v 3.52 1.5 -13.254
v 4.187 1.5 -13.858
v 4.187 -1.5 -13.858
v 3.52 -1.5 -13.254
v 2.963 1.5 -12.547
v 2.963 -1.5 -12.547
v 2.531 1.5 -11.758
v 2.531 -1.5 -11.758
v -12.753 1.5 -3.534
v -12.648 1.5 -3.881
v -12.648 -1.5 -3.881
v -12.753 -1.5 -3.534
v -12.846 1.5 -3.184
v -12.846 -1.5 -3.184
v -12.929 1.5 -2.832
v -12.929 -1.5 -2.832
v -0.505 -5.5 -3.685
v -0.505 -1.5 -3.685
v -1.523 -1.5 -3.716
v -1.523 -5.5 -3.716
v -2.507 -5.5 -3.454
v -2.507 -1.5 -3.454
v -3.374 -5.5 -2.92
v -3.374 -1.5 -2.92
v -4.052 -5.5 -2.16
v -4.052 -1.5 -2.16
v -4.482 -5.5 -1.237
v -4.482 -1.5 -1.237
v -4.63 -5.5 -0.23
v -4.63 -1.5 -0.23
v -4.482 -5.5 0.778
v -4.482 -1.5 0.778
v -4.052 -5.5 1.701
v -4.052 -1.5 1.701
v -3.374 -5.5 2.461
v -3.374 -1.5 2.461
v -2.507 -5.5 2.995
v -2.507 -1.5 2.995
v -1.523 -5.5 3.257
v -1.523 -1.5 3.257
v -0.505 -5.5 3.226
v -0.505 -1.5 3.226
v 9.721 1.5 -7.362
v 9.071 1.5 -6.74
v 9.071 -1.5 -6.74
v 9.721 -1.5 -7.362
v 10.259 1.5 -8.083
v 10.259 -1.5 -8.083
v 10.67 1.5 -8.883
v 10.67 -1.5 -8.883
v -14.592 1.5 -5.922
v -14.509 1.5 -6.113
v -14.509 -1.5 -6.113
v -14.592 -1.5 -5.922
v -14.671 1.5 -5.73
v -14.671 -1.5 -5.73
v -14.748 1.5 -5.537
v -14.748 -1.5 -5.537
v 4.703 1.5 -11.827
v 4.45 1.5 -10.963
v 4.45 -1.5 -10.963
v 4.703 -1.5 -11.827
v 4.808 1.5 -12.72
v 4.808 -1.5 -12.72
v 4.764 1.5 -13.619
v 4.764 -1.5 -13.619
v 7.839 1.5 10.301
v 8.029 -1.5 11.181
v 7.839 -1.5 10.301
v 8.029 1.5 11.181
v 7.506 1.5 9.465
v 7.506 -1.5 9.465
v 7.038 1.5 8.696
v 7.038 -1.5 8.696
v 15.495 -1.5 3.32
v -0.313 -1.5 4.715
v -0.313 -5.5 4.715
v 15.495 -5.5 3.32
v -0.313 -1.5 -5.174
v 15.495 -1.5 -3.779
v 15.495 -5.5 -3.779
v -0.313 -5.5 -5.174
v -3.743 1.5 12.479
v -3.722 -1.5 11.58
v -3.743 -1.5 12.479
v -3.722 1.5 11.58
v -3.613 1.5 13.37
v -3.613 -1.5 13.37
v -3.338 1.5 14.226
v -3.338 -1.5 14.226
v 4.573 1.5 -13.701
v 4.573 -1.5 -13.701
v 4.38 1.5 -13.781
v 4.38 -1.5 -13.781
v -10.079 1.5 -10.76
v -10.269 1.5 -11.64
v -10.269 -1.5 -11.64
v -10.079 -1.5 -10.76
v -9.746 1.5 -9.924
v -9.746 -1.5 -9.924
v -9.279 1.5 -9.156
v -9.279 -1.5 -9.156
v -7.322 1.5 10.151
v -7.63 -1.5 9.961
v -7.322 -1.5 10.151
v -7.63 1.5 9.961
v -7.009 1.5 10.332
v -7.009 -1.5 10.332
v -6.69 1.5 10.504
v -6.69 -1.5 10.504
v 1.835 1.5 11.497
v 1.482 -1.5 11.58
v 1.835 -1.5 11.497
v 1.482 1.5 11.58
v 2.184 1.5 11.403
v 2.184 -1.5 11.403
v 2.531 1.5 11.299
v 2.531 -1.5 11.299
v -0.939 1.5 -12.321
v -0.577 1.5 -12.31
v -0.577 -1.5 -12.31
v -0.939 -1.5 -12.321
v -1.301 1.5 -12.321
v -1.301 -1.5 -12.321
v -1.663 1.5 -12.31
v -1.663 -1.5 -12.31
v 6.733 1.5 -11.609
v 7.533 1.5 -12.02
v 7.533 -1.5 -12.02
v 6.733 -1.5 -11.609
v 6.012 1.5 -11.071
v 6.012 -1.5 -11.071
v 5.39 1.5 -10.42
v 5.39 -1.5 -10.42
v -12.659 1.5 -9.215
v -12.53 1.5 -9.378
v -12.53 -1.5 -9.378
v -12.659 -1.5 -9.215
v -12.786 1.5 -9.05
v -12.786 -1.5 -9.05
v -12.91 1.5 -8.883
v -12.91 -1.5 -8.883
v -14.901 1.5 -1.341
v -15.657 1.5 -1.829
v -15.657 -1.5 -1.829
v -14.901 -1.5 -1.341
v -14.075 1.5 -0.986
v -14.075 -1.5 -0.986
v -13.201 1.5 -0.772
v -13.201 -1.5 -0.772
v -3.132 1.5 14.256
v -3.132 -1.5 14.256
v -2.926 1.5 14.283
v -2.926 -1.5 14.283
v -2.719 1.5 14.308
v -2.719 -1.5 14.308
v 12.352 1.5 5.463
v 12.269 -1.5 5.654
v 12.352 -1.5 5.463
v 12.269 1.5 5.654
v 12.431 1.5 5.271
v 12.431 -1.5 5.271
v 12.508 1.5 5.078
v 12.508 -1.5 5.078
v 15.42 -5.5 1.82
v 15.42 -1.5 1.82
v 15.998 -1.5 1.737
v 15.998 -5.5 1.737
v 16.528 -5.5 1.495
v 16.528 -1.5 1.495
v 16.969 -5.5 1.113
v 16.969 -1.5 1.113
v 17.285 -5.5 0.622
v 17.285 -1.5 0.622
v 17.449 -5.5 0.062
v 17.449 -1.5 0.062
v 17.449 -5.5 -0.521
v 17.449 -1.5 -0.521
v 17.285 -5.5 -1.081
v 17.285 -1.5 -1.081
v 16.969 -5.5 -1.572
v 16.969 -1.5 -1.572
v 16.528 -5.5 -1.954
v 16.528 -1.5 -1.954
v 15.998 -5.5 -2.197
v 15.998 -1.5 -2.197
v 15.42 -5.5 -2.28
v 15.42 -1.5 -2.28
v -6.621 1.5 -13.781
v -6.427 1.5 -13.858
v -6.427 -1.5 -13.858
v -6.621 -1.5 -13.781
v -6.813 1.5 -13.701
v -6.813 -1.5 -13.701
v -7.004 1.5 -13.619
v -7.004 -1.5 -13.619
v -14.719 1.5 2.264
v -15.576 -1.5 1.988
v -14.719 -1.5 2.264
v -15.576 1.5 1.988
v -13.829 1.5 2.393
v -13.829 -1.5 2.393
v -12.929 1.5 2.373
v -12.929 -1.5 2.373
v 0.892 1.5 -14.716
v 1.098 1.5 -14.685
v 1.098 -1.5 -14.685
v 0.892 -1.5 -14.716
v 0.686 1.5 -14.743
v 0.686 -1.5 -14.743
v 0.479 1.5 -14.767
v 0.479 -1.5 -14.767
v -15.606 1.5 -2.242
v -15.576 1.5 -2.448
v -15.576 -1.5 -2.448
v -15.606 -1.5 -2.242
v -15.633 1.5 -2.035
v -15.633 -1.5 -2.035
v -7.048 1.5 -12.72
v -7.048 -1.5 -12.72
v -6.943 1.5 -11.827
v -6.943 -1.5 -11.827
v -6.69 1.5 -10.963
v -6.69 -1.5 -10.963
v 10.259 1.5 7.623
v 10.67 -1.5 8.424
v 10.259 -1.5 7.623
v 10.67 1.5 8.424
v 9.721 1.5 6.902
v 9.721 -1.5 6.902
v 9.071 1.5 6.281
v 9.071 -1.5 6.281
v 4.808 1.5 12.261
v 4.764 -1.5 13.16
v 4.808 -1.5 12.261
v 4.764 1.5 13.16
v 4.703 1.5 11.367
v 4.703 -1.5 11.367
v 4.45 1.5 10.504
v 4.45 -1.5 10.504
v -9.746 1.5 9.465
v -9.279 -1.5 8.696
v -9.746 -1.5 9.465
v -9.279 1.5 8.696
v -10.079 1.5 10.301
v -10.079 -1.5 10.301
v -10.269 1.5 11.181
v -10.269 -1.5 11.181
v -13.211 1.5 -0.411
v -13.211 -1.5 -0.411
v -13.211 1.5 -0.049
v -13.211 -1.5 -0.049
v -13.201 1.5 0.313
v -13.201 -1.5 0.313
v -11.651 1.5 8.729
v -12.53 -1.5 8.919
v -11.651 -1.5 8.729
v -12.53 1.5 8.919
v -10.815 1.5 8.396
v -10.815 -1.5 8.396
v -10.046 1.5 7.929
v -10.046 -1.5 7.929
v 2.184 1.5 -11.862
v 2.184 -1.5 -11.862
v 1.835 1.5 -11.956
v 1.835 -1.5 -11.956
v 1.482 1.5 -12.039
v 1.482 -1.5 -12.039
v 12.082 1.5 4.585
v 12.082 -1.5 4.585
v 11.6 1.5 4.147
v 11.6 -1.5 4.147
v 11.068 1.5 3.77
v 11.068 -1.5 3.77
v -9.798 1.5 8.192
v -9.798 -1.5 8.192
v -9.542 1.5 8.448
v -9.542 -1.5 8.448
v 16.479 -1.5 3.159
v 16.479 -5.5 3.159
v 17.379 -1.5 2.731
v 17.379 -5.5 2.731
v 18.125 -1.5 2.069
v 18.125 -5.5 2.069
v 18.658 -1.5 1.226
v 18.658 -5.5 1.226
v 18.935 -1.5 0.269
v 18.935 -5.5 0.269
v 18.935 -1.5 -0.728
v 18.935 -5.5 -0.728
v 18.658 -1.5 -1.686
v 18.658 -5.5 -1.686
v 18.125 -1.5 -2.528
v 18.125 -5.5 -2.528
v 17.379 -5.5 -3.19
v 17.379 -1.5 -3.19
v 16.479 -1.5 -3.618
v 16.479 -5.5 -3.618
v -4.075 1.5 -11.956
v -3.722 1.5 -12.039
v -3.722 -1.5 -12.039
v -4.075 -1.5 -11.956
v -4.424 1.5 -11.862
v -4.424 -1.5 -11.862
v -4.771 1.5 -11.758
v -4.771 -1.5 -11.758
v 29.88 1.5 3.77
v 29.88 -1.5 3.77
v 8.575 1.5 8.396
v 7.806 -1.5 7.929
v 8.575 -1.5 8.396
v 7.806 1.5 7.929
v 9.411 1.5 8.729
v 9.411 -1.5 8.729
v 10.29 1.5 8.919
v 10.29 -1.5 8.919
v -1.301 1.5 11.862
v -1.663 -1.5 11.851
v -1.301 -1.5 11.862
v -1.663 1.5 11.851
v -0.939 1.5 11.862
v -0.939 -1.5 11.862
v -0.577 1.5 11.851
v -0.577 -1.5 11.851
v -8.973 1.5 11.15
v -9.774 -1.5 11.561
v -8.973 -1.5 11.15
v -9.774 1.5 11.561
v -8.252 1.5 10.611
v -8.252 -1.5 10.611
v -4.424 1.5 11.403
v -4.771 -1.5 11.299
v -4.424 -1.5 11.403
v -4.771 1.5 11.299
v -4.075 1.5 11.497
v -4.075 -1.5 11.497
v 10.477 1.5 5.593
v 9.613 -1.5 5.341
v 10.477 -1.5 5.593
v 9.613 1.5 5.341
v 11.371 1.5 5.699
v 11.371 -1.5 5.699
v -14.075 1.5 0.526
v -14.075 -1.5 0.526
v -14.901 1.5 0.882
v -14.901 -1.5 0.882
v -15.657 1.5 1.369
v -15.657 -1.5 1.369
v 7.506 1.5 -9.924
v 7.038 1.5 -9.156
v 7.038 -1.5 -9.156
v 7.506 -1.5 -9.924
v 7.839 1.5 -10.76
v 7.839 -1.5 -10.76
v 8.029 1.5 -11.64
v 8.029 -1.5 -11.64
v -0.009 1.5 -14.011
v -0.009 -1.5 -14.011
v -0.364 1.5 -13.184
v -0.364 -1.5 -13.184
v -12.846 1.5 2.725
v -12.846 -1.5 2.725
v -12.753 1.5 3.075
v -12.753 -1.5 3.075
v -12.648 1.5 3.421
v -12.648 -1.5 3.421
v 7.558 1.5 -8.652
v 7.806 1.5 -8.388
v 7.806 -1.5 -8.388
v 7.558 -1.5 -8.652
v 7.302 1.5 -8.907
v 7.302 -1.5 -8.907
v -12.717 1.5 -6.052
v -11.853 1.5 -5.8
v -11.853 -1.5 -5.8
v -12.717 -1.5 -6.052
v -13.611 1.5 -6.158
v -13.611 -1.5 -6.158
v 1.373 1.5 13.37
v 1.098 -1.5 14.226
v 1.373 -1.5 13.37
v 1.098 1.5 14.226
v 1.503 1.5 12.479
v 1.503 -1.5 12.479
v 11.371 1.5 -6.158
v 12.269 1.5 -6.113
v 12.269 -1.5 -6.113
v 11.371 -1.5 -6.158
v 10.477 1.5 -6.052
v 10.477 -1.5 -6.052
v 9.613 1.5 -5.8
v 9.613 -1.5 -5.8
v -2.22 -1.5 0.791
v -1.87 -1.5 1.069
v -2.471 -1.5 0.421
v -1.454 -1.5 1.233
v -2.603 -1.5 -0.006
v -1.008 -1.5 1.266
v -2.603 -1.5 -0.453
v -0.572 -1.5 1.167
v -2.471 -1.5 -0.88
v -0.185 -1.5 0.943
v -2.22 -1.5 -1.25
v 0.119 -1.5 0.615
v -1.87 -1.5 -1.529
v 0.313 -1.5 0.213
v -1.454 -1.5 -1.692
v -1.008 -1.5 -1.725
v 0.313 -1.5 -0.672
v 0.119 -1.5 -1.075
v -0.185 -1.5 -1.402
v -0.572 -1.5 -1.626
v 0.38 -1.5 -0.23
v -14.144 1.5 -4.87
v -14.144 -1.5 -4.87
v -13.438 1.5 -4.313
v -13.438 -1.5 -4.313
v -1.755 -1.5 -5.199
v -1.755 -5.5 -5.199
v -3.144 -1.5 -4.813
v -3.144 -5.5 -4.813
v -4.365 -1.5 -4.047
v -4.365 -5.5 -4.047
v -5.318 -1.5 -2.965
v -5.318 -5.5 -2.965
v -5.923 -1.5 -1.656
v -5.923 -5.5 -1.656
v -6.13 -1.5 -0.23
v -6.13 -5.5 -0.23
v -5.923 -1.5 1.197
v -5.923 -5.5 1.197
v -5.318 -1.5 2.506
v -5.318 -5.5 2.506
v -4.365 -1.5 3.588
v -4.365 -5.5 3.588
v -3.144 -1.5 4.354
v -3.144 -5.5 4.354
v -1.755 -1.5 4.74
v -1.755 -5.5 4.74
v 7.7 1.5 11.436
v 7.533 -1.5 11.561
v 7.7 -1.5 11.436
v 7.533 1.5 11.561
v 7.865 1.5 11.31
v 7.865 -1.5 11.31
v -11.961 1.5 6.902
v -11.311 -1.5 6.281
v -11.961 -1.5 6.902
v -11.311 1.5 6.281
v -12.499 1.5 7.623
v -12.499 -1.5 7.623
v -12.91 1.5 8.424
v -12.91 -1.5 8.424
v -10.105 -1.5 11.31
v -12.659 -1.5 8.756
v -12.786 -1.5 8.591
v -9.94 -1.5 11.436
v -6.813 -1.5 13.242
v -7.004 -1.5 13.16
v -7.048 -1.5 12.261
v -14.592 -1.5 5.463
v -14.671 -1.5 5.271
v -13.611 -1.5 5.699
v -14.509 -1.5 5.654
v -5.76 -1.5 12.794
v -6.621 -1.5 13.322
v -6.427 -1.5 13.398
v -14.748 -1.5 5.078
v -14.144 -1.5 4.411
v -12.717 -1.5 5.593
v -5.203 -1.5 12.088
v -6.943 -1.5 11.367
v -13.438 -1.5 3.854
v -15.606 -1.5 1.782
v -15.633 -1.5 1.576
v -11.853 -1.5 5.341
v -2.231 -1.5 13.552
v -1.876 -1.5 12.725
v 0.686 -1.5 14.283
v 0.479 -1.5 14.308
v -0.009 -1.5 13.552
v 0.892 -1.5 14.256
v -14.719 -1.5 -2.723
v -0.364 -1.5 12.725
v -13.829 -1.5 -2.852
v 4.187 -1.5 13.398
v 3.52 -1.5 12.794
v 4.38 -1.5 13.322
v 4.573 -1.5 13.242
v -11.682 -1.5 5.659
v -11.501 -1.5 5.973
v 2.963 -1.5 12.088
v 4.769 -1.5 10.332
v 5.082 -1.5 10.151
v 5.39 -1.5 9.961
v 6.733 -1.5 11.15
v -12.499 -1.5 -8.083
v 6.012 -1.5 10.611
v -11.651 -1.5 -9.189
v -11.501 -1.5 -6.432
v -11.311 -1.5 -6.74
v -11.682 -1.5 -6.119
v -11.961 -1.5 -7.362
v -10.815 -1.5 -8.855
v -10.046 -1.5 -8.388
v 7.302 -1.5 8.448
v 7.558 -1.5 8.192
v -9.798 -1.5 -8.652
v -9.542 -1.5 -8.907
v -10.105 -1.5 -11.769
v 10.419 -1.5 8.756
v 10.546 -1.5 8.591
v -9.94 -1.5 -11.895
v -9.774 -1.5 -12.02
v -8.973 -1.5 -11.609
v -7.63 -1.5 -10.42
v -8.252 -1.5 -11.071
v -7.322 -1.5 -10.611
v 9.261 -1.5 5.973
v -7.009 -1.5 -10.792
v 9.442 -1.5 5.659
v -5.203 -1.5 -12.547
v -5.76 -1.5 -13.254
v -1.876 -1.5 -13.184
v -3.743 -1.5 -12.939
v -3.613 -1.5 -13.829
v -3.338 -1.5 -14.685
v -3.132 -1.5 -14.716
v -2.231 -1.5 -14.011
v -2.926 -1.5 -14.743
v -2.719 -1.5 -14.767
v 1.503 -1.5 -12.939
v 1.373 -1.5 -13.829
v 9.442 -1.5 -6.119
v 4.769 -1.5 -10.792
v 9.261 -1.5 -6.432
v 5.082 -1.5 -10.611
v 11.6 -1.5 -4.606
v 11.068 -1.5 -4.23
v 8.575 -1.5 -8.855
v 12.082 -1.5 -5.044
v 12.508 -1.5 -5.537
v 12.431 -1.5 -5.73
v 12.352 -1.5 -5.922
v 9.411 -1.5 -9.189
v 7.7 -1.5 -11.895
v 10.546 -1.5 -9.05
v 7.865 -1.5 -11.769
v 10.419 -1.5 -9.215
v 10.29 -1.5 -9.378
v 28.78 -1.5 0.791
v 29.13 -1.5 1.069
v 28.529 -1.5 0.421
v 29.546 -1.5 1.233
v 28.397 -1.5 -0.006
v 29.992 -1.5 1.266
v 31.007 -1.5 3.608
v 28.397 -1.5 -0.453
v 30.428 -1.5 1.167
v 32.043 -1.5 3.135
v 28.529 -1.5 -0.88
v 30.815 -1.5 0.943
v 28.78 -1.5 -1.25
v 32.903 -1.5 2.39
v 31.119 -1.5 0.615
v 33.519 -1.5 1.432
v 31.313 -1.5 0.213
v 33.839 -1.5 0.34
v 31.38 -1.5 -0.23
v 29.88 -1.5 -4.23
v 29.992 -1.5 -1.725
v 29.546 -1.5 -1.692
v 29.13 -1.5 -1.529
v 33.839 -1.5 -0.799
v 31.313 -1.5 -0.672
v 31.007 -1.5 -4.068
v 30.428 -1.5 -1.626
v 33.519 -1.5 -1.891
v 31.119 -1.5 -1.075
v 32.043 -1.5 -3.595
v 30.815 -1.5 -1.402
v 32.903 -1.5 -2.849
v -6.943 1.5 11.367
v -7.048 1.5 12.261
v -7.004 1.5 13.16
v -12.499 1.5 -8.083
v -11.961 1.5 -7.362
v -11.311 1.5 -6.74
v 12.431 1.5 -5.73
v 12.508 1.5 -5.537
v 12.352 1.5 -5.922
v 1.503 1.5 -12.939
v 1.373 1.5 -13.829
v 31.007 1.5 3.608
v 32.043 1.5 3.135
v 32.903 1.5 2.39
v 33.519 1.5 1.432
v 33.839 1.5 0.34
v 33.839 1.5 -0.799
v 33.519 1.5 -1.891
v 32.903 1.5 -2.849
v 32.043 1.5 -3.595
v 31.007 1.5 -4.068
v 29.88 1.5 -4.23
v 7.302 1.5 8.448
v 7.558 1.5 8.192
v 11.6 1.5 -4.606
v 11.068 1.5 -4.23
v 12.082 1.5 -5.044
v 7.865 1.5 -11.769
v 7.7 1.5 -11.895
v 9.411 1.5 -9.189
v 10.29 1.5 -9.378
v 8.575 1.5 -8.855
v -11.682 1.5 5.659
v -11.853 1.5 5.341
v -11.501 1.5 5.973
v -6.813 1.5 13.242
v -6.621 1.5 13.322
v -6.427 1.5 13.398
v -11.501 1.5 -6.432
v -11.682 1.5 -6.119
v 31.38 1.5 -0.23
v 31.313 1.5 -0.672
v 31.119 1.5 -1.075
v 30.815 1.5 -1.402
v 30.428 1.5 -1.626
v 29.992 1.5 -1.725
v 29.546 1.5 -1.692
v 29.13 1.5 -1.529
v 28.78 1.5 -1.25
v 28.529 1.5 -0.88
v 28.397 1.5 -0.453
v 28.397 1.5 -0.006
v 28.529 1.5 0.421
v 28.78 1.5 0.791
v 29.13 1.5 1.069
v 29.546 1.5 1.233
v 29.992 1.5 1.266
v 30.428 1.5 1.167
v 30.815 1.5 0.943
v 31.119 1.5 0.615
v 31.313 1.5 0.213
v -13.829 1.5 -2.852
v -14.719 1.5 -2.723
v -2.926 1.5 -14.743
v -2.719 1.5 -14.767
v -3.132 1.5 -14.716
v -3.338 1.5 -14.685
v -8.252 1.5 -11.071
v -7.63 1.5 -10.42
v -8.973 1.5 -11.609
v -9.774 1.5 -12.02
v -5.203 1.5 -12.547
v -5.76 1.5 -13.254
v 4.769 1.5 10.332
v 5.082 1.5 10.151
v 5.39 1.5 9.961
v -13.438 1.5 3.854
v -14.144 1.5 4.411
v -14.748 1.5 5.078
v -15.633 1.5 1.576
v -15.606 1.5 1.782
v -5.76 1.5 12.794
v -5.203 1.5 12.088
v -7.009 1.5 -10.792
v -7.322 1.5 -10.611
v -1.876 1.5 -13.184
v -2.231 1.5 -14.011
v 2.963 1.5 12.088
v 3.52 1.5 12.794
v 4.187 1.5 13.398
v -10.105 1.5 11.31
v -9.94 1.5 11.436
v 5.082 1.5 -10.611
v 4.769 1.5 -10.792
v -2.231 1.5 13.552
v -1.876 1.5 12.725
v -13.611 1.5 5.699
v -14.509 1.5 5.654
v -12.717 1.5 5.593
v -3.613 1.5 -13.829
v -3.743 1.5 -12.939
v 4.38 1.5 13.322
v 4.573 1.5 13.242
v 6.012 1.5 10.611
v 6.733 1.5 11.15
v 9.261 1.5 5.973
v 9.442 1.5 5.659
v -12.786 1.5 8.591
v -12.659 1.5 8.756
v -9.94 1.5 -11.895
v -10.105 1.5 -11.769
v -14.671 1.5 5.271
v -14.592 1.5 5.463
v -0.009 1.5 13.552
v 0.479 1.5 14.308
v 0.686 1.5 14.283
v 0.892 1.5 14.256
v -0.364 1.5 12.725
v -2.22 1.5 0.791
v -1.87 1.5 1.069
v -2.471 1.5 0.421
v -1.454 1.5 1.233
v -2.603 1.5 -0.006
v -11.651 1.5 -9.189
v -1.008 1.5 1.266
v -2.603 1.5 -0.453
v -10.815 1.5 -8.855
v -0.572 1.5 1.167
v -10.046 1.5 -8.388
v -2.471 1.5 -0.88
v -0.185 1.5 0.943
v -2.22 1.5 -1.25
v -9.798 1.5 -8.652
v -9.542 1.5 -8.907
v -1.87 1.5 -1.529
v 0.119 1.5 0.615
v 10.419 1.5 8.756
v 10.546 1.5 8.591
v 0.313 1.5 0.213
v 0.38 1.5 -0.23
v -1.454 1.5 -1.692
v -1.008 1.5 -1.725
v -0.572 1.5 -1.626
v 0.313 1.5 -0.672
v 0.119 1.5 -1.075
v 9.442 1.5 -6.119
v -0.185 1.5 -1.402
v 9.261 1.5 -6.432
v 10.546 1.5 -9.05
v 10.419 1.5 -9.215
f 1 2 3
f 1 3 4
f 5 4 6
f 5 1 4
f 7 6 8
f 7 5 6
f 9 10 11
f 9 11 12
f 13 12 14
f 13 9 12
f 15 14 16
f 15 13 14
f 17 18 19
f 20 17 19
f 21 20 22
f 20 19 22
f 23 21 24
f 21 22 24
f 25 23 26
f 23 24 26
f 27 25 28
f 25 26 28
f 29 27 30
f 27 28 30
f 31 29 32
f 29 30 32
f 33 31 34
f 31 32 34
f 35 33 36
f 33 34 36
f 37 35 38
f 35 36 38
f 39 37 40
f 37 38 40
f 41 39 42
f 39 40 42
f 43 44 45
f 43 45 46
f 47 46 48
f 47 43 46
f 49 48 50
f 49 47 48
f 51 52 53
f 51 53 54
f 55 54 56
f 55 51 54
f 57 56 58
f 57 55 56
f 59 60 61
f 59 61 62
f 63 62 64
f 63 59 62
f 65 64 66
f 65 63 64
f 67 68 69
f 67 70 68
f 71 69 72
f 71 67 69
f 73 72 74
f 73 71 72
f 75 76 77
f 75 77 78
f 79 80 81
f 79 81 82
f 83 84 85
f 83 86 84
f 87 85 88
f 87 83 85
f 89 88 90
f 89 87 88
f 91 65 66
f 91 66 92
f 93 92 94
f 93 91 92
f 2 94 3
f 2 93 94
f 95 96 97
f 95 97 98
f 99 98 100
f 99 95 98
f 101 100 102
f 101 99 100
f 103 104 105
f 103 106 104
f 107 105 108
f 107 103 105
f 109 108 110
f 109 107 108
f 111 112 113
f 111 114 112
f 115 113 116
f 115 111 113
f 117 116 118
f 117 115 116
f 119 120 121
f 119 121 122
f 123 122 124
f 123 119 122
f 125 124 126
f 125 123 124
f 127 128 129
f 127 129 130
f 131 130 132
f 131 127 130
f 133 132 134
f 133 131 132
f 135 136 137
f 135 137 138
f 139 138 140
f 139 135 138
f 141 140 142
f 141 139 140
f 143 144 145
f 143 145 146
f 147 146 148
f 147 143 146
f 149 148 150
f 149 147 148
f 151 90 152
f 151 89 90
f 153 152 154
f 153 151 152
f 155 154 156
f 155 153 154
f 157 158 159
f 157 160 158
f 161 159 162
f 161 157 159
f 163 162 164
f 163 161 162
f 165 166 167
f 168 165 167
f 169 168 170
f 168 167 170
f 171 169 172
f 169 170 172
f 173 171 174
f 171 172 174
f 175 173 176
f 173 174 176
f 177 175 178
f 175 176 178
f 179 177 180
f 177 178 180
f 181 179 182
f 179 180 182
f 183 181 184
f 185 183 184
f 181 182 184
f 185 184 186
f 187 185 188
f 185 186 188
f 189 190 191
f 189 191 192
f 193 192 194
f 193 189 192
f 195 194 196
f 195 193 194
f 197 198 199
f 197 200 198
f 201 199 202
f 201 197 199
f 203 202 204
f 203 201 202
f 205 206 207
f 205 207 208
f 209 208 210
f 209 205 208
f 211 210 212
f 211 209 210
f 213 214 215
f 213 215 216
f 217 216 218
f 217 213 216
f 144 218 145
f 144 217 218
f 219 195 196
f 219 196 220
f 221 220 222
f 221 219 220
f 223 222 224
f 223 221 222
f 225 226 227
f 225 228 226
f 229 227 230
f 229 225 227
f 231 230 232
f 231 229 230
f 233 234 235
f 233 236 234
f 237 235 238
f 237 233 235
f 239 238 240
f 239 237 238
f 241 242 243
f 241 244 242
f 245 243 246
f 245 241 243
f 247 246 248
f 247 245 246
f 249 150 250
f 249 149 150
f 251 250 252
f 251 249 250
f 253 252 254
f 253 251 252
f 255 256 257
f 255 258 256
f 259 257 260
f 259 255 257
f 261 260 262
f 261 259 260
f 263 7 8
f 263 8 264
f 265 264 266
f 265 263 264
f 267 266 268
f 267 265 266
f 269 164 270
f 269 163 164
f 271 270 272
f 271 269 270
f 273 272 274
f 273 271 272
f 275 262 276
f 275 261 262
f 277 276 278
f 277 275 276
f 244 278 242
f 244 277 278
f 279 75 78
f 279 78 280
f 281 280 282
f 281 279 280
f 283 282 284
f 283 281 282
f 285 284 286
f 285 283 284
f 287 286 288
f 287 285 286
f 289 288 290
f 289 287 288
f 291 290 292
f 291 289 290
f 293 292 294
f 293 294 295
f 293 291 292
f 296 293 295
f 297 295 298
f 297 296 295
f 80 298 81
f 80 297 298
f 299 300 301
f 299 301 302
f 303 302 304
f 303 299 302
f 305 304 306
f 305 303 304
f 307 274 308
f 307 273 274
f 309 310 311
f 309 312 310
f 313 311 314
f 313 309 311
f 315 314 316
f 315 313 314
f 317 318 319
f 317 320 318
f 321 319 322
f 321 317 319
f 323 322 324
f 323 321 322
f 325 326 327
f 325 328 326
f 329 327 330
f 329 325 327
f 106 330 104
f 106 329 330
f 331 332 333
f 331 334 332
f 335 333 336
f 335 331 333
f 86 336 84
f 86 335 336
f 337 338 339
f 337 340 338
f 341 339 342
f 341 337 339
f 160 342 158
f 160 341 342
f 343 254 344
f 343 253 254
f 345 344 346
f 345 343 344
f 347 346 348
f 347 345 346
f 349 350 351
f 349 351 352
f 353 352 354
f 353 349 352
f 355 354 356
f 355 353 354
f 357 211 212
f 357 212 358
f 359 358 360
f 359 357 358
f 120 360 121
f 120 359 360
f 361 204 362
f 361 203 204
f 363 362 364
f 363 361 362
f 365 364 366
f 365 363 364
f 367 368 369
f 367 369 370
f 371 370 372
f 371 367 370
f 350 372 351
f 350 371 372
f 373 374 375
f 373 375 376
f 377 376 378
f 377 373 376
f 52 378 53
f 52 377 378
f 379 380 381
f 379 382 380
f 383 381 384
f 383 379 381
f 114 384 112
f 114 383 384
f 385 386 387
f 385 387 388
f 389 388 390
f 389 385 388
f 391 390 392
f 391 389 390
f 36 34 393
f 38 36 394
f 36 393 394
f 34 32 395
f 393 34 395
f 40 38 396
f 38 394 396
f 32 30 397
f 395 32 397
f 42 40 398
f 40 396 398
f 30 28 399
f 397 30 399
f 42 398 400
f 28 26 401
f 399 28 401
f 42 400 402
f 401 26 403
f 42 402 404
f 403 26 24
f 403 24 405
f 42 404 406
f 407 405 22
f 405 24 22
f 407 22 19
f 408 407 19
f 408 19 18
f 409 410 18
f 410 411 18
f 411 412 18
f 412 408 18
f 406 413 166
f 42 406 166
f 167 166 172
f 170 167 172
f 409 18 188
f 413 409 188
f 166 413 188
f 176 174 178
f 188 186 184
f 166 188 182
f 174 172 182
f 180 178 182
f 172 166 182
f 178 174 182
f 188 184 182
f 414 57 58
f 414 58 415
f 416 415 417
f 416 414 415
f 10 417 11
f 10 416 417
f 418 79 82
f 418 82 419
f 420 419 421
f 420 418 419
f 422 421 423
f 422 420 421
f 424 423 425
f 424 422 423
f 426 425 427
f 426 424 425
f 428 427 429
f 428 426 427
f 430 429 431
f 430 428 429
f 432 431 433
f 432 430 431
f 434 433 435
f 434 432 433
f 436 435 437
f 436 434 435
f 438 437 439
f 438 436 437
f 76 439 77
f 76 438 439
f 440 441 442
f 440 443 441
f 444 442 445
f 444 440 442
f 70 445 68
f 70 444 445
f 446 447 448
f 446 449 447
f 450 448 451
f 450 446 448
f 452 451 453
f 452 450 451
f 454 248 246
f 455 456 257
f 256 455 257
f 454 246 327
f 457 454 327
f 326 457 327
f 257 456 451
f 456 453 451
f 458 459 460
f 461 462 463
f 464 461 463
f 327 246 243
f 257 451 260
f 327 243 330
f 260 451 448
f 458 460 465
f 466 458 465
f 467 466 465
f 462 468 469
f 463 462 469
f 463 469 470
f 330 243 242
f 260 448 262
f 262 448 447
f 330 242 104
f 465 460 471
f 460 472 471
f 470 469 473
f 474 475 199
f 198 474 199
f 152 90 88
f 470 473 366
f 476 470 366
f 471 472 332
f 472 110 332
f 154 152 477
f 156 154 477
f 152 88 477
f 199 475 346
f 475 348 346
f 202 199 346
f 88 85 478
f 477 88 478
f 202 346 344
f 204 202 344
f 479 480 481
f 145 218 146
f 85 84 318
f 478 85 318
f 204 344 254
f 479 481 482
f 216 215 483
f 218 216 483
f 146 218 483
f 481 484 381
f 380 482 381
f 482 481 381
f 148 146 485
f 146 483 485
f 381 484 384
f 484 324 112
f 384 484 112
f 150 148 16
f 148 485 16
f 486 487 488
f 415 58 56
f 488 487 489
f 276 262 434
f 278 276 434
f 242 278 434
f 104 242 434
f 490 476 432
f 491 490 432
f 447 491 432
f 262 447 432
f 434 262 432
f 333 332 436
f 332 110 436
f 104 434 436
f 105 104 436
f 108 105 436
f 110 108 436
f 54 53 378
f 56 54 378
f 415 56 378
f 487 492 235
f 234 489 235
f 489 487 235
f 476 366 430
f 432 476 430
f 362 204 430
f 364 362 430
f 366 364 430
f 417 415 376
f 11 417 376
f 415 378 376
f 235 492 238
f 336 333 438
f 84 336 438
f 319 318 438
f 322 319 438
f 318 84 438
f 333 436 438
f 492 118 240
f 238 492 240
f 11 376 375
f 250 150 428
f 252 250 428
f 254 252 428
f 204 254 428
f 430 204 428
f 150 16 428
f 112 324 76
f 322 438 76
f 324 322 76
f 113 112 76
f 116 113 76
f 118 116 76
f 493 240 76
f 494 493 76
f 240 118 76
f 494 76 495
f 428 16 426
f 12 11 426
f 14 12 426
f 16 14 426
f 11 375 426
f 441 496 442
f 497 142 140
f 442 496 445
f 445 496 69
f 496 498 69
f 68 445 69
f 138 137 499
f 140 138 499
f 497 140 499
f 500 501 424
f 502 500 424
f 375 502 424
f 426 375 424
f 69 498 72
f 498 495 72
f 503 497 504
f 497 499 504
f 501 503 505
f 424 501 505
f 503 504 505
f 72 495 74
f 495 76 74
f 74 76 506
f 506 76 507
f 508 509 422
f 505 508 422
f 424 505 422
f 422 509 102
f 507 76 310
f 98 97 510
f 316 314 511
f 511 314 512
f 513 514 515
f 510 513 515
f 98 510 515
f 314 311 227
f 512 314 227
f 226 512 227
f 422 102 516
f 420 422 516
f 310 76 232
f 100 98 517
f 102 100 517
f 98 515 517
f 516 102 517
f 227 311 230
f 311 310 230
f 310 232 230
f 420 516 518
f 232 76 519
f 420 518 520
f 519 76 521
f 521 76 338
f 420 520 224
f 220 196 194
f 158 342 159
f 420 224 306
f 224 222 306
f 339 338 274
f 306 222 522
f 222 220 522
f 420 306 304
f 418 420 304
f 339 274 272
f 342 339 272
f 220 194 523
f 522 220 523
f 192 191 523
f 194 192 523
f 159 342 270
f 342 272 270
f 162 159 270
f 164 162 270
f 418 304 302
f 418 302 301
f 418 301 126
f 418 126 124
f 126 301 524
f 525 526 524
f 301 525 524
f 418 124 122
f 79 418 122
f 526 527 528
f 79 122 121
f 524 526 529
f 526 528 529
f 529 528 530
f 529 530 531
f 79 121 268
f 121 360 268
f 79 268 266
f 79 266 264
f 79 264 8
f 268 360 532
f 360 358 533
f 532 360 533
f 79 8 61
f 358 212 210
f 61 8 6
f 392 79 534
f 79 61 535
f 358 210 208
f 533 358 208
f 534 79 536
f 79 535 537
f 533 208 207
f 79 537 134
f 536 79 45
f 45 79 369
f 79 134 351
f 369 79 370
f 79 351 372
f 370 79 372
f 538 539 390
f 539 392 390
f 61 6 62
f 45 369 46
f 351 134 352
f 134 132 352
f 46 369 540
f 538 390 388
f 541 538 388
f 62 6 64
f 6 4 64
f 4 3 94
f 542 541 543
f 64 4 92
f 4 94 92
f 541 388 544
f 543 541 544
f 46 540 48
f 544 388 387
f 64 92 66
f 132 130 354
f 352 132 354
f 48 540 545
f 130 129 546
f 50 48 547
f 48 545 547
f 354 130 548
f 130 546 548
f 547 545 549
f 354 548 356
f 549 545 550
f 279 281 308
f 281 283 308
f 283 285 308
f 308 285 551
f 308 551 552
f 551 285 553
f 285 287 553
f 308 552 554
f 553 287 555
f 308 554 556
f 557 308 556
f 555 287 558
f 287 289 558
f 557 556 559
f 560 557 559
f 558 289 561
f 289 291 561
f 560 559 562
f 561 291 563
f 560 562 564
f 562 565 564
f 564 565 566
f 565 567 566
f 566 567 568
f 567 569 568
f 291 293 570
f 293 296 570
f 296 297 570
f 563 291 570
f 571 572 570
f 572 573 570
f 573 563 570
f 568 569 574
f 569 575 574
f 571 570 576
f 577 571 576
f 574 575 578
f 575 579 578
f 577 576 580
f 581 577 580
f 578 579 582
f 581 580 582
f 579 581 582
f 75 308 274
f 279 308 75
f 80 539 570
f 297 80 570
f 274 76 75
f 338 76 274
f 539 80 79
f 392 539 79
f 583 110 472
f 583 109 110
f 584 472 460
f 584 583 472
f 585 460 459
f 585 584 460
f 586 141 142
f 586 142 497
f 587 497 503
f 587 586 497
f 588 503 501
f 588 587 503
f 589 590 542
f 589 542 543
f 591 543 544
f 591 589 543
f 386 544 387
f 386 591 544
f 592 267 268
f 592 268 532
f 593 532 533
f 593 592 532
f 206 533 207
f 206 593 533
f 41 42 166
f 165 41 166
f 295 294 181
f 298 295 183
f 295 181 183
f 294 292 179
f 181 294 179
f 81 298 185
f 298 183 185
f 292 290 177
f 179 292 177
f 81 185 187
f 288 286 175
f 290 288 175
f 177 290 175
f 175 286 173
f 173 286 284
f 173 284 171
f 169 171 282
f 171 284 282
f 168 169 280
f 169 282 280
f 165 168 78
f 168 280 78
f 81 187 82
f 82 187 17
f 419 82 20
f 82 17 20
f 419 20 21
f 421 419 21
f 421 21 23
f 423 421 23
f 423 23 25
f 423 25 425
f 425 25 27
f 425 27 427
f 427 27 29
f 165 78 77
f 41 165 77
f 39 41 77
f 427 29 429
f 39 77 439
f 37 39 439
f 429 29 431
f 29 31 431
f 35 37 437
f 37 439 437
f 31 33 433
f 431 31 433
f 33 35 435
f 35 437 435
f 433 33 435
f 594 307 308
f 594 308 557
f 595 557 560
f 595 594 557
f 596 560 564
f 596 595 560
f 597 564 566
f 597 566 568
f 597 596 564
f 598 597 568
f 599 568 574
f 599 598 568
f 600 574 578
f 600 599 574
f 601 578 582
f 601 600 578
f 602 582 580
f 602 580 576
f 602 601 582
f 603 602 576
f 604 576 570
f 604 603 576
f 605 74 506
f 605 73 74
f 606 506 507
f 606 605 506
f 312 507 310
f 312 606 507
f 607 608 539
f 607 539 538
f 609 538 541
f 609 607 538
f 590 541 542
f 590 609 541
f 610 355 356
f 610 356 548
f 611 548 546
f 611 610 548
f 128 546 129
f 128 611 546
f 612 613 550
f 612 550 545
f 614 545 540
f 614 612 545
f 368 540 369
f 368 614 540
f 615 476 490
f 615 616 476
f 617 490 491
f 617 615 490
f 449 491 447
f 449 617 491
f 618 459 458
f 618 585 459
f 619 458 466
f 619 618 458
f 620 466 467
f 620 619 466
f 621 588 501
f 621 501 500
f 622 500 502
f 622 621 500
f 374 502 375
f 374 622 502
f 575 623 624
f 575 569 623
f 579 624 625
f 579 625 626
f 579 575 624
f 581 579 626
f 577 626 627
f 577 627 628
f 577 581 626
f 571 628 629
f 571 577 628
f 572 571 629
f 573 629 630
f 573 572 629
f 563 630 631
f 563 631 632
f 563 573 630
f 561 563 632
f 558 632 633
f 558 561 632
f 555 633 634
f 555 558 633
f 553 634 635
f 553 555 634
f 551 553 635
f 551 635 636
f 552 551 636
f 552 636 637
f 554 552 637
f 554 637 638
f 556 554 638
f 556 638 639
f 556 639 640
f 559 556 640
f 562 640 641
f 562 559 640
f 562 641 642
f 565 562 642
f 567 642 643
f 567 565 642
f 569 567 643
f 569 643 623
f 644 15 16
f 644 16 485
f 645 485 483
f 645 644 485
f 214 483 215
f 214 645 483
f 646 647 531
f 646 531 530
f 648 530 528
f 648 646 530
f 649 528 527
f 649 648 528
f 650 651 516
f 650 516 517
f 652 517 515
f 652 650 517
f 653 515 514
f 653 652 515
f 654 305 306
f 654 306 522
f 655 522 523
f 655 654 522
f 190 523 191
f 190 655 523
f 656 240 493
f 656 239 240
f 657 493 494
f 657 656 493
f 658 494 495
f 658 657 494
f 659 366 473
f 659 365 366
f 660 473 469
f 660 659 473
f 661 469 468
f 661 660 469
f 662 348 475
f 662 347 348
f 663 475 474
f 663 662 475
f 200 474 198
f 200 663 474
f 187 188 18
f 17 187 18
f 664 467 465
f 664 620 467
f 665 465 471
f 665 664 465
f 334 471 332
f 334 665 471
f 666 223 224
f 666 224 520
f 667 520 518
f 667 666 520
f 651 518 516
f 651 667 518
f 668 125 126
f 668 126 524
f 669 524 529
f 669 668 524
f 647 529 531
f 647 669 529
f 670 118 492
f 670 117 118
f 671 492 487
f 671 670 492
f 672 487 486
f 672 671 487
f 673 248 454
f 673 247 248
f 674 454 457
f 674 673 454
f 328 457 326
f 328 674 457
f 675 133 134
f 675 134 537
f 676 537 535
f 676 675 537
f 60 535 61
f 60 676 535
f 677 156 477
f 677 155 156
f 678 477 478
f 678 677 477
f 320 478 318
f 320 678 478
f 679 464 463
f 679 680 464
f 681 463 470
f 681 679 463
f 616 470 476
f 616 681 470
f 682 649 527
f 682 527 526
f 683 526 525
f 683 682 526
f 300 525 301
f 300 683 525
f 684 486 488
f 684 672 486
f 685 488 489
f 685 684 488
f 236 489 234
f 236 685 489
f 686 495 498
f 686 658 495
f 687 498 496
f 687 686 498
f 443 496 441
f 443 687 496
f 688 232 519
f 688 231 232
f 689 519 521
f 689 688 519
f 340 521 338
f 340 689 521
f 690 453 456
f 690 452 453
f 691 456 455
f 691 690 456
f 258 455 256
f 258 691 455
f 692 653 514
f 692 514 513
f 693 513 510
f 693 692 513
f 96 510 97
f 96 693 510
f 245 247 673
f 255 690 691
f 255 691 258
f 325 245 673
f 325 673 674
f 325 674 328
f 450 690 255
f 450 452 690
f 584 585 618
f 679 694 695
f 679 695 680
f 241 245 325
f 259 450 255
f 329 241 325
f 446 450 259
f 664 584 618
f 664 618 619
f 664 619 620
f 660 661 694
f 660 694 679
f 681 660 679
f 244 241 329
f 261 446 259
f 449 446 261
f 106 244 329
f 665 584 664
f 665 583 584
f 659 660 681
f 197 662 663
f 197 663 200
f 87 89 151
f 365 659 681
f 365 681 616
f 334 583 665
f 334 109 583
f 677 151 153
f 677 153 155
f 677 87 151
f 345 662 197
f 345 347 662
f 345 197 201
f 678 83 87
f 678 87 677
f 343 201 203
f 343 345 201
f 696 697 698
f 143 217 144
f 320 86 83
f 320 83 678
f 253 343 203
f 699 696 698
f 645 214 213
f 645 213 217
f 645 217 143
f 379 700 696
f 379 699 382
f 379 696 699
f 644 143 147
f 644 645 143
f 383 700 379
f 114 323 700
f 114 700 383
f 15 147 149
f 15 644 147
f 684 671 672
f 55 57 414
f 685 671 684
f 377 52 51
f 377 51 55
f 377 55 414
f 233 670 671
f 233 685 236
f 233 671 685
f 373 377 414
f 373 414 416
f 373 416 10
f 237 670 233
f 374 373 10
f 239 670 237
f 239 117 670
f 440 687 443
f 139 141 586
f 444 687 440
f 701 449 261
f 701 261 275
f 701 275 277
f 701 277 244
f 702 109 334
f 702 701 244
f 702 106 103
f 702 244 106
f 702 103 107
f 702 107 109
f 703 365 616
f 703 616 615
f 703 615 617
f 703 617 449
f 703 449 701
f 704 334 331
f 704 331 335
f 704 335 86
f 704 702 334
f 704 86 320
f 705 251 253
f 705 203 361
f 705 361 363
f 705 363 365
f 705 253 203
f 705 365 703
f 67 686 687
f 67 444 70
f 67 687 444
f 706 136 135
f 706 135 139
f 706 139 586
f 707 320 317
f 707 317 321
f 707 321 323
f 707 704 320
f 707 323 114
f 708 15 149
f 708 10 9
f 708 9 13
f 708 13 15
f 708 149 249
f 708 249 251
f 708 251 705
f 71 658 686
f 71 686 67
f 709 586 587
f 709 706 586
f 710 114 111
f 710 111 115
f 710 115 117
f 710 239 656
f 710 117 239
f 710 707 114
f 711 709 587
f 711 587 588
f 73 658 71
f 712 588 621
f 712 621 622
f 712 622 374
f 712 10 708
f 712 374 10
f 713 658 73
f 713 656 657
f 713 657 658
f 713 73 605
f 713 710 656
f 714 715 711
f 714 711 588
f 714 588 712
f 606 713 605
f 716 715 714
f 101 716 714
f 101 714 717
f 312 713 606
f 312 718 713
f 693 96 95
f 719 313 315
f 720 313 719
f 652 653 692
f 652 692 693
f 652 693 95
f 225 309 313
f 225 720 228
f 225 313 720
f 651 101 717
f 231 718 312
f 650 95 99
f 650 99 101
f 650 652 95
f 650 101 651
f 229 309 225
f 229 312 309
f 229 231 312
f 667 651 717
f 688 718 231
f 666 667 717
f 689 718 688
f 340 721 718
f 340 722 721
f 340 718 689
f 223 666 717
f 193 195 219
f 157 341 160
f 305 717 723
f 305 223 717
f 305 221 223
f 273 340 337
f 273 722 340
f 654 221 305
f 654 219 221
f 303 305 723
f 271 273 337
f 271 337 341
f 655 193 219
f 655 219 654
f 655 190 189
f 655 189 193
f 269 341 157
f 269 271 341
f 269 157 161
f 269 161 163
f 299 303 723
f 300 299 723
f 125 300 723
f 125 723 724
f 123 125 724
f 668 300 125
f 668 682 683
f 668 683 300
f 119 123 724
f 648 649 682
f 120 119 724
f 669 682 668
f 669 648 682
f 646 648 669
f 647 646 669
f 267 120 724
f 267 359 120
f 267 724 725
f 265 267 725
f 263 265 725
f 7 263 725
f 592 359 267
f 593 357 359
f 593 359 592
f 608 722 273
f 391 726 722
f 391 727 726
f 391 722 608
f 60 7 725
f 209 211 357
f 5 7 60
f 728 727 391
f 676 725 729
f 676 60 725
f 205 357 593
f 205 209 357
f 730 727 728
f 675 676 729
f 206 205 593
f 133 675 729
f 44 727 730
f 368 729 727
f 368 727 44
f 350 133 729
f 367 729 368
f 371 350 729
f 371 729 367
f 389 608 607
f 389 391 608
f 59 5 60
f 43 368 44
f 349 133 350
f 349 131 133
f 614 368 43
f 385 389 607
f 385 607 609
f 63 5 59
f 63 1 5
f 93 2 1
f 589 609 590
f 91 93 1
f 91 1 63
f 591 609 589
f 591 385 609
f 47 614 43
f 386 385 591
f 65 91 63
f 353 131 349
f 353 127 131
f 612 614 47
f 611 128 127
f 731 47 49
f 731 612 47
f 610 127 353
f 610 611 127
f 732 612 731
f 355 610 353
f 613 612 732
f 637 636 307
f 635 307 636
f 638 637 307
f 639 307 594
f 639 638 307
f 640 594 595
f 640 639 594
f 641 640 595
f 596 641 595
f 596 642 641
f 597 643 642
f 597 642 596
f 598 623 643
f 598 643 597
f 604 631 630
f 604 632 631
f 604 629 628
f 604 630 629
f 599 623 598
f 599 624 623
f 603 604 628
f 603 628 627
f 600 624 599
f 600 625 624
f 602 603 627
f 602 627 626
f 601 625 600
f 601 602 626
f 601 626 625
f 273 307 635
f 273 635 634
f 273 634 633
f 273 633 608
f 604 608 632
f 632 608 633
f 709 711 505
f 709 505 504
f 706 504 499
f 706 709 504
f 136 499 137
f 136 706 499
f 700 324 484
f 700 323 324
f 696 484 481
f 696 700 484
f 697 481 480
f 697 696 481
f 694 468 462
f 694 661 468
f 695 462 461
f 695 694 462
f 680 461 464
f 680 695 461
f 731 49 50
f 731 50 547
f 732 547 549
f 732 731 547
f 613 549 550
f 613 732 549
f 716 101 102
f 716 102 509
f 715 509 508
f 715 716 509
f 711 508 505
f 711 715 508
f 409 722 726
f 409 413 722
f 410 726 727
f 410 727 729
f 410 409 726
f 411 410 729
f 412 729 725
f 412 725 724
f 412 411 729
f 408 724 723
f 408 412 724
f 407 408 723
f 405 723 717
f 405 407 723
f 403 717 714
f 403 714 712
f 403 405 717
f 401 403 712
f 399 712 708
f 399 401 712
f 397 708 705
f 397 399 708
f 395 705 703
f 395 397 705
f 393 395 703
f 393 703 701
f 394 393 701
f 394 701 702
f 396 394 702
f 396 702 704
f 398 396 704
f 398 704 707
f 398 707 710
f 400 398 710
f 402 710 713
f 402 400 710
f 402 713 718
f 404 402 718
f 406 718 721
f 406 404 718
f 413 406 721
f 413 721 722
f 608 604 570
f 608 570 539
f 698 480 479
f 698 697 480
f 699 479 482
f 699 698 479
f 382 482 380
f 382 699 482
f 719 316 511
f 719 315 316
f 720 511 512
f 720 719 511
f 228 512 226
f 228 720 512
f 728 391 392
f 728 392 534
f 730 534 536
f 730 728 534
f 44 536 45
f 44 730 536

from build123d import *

# Parameters (mm, degrees)
SKETCH1_R           = 1.5
BOSS_EXTRUDE1_DEPTH = 1.5
BOSS_EXTRUDE2_DEPTH = 4


with BuildPart() as part:
    # Sketch1 → Boss-Extrude1 (new body, symmetric)
    with BuildSketch(Plane(origin=(0, 0, 0), x_dir=(1, 0, 0), z_dir=(0, 1, 0))):
        with BuildLine():
            Line((11.067960149, -3.770386358), (29.879975659, -3.770386358))
            ThreePointArc((29.879975659, -3.770386358), (33.879975659, 0.229613642), (29.879975659, 4.229613642))
            Line((29.879975659, 4.229613642), (11.067960149, 4.229613642))
            ThreePointArc((11.067960149, 4.229613642), (11.847346546, 4.817815376), (12.508067649, 5.536753523))
            ThreePointArc((12.508067649, 5.536753523), (12.391713822, 5.826358841), (12.269206518, 6.113415305))
            ThreePointArc((12.269206518, 6.113415305), (10.921594192, 6.123653667), (9.613413173, 5.799884882))
            ThreePointArc((9.613413173, 5.799884882), (9.35260436, 6.275988642), (9.070690816, 6.73990758))
            ThreePointArc((9.070690816, 6.73990758), (10.005173318, 7.710941183), (10.670112799, 8.883126872))
            ThreePointArc((10.670112799, 8.883126872), (10.482768261, 9.132749542), (10.290139612, 9.378317571))
            ThreePointArc((10.290139612, 9.378317571), (8.985796179, 9.039419334), (7.805987876, 8.38810054))
            ThreePointArc((7.805987876, 8.38810054), (7.430841187, 8.780479171), (7.038462557, 9.155625859))
            ThreePointArc((7.038462557, 9.155625859), (7.68978135, 10.335434163), (8.028679587, 11.639777595))
            ThreePointArc((8.028679587, 11.639777595), (7.783111558, 11.832406244), (7.533488888, 12.019750783))
            ThreePointArc((7.533488888, 12.019750783), (6.361303199, 11.354811301), (5.390269597, 10.420328799))
            ThreePointArc((5.390269597, 10.420328799), (4.926350659, 10.702242344), (4.450246898, 10.963051157))
            ThreePointArc((4.450246898, 10.963051157), (4.774015684, 12.271232176), (4.763777322, 13.618844501))
            ThreePointArc((4.763777322, 13.618844501), (4.476720857, 13.741351805), (4.187115539, 13.857705633))
            ThreePointArc((4.187115539, 13.857705633), (3.22697011, 12.912039434), (2.530885544, 11.758076661))
            ThreePointArc((2.530885544, 11.758076661), (2.009809666, 11.910313178), (1.48242646, 12.039010426))
            ThreePointArc((1.48242646, 12.039010426), (1.45658093, 13.386413785), (1.097903696, 14.685457451))
            ThreePointArc((1.097903696, 14.685457451), (0.78892122, 14.72949474), (0.479069377, 14.766928535))
            ThreePointArc((0.479069377, 14.766928535), (-0.203603467, 13.604981207), (-0.577301983, 12.31017882))
            ThreePointArc((-0.577301983, 12.31017882), (-1.120024341, 12.322363642), (-1.662746699, 12.31017882))
            ThreePointArc((-1.662746699, 12.31017882), (-2.036445216, 13.604981207), (-2.71911806, 14.766928535))
            ThreePointArc((-2.71911806, 14.766928535), (-3.028969902, 14.72949474), (-3.337952378, 14.685457451))
            ThreePointArc((-3.337952378, 14.685457451), (-3.696629612, 13.386413785), (-3.722475143, 12.039010426))
            ThreePointArc((-3.722475143, 12.039010426), (-4.249858349, 11.910313178), (-4.770934227, 11.758076661))
            ThreePointArc((-4.770934227, 11.758076661), (-5.467018792, 12.912039434), (-6.427164221, 13.857705633))
            ThreePointArc((-6.427164221, 13.857705633), (-6.71676954, 13.741351805), (-7.003826004, 13.618844501))
            ThreePointArc((-7.003826004, 13.618844501), (-7.014064366, 12.271232176), (-6.690295581, 10.963051157))
            ThreePointArc((-6.690295581, 10.963051157), (-7.166399341, 10.702242344), (-7.630318279, 10.420328799))
            ThreePointArc((-7.630318279, 10.420328799), (-8.601351881, 11.354811301), (-9.773537571, 12.019750783))
            ThreePointArc((-9.773537571, 12.019750783), (-10.02316024, 11.832406244), (-10.26872827, 11.639777595))
            ThreePointArc((-10.26872827, 11.639777595), (-9.929830033, 10.335434163), (-9.278511239, 9.155625859))
            ThreePointArc((-9.278511239, 9.155625859), (-9.670889869, 8.780479171), (-10.046036558, 8.38810054))
            ThreePointArc((-10.046036558, 8.38810054), (-11.225844862, 9.039419334), (-12.530188294, 9.378317571))
            ThreePointArc((-12.530188294, 9.378317571), (-12.722816943, 9.132749542), (-12.910161481, 8.883126872))
            ThreePointArc((-12.910161481, 8.883126872), (-12.245222, 7.710941183), (-11.310739498, 6.73990758))
            ThreePointArc((-11.310739498, 6.73990758), (-11.592653043, 6.275988642), (-11.853461856, 5.799884882))
            ThreePointArc((-11.853461856, 5.799884882), (-13.161642874, 6.123653667), (-14.5092552, 6.113415305))
            ThreePointArc((-14.5092552, 6.113415305), (-14.631762504, 5.826358841), (-14.748116331, 5.536753523))
            ThreePointArc((-14.748116331, 5.536753523), (-13.802450133, 4.576608094), (-12.64848736, 3.880523528))
            ThreePointArc((-12.64848736, 3.880523528), (-12.800723877, 3.35944765), (-12.929421125, 2.832064444))
            ThreePointArc((-12.929421125, 2.832064444), (-14.276824484, 2.806218913), (-15.57586815, 2.44754168))
            ThreePointArc((-15.57586815, 2.44754168), (-15.619905439, 2.138559204), (-15.657339233, 1.828707361))
            ThreePointArc((-15.657339233, 1.828707361), (-14.495391906, 1.146034517), (-13.200589518, 0.772336))
            ThreePointArc((-13.200589518, 0.772336), (-13.212774341, 0.229613642), (-13.200589518, -0.313108715))
            ThreePointArc((-13.200589518, -0.313108715), (-14.495391906, -0.686807232), (-15.657339233, -1.369480076))
            ThreePointArc((-15.657339233, -1.369480076), (-15.619905439, -1.679331919), (-15.57586815, -1.988314395))
            ThreePointArc((-15.57586815, -1.988314395), (-14.276824484, -2.346991628), (-12.929421125, -2.372837159))
            ThreePointArc((-12.929421125, -2.372837159), (-12.800723877, -2.900220365), (-12.64848736, -3.421296243))
            ThreePointArc((-12.64848736, -3.421296243), (-13.802450133, -4.117380809), (-14.748116331, -5.077526238))
            ThreePointArc((-14.748116331, -5.077526238), (-14.631762504, -5.367131556), (-14.5092552, -5.65418802))
            ThreePointArc((-14.5092552, -5.65418802), (-13.161642874, -5.664426382), (-11.853461856, -5.340657597))
            ThreePointArc((-11.853461856, -5.340657597), (-11.592653043, -5.816761358), (-11.310739498, -6.280680295))
            ThreePointArc((-11.310739498, -6.280680295), (-12.245222, -7.251713898), (-12.910161481, -8.423899587))
            ThreePointArc((-12.910161481, -8.423899587), (-12.722816943, -8.673522257), (-12.530188294, -8.919090286))
            ThreePointArc((-12.530188294, -8.919090286), (-11.225844862, -8.580192049), (-10.046036558, -7.928873256))
            ThreePointArc((-10.046036558, -7.928873256), (-9.670889869, -8.321251886), (-9.278511239, -8.696398575))
            ThreePointArc((-9.278511239, -8.696398575), (-9.929830033, -9.876206878), (-10.26872827, -11.18055031))
            ThreePointArc((-10.26872827, -11.18055031), (-10.02316024, -11.373178959), (-9.773537571, -11.560523498))
            ThreePointArc((-9.773537571, -11.560523498), (-8.601351881, -10.895584017), (-7.630318279, -9.961101514))
            ThreePointArc((-7.630318279, -9.961101514), (-7.166399341, -10.243015059), (-6.690295581, -10.503823872))
            ThreePointArc((-6.690295581, -10.503823872), (-7.014064366, -11.812004891), (-7.003826004, -13.159617217))
            ThreePointArc((-7.003826004, -13.159617217), (-6.71676954, -13.282124521), (-6.427164222, -13.398478348))
            ThreePointArc((-6.427164222, -13.398478348), (-5.467018793, -12.452812149), (-4.770934227, -11.298849376))
            ThreePointArc((-4.770934227, -11.298849376), (-4.249858349, -11.451085894), (-3.722475143, -11.579783141))
            ThreePointArc((-3.722475143, -11.579783141), (-3.696629612, -12.9271865), (-3.337952379, -14.226230166))
            ThreePointArc((-3.337952379, -14.226230166), (-3.028969902, -14.270267455), (-2.71911806, -14.30770125))
            ThreePointArc((-2.71911806, -14.30770125), (-2.036445216, -13.145753923), (-1.662746699, -11.850951535))
            ThreePointArc((-1.662746699, -11.850951535), (-1.120024341, -11.863136358), (-0.577301983, -11.850951535))
            ThreePointArc((-0.577301983, -11.850951535), (-0.203603467, -13.145753923), (0.479069377, -14.30770125))
            ThreePointArc((0.479069377, -14.30770125), (0.78892122, -14.270267455), (1.097903696, -14.226230166))
            ThreePointArc((1.097903696, -14.226230166), (1.45658093, -12.9271865), (1.48242646, -11.579783141))
            ThreePointArc((1.48242646, -11.579783141), (2.009809666, -11.451085893), (2.530885544, -11.298849376))
            ThreePointArc((2.530885544, -11.298849376), (3.22697011, -12.452812149), (4.187115539, -13.398478348))
            ThreePointArc((4.187115539, -13.398478348), (4.476720857, -13.282124521), (4.763777322, -13.159617216))
            ThreePointArc((4.763777322, -13.159617216), (4.774015684, -11.812004891), (4.450246898, -10.503823872))
            ThreePointArc((4.450246898, -10.503823872), (4.926350659, -10.243015059), (5.390269597, -9.961101514))
            ThreePointArc((5.390269597, -9.961101514), (6.361303199, -10.895584017), (7.533488888, -11.560523498))
            ThreePointArc((7.533488888, -11.560523498), (7.783111558, -11.373178959), (8.028679587, -11.18055031))
            ThreePointArc((8.028679587, -11.18055031), (7.68978135, -9.876206878), (7.038462557, -8.696398575))
            ThreePointArc((7.038462557, -8.696398575), (7.430841187, -8.321251886), (7.805987876, -7.928873256))
            ThreePointArc((7.805987876, -7.928873256), (8.985796179, -8.580192049), (10.290139612, -8.919090286))
            ThreePointArc((10.290139612, -8.919090286), (10.482768261, -8.673522257), (10.670112799, -8.423899587))
            ThreePointArc((10.670112799, -8.423899587), (10.005173318, -7.251713898), (9.070690816, -6.280680295))
            ThreePointArc((9.070690816, -6.280680295), (9.35260436, -5.816761358), (9.613413173, -5.340657597))
            ThreePointArc((9.613413173, -5.340657597), (10.921594192, -5.664426382), (12.269206518, -5.65418802))
            ThreePointArc((12.269206518, -5.65418802), (12.391713822, -5.367131556), (12.508067649, -5.077526238))
            ThreePointArc((12.508067649, -5.077526238), (11.847346546, -4.358588091), (11.067960149, -3.770386358))
        make_face()
        with Locations((29.879975659, 0.229613642)):
            Circle(SKETCH1_R, mode=Mode.SUBTRACT)
        with Locations((-1.120024341, 0.229613642)):
            Circle(SKETCH1_R, mode=Mode.SUBTRACT)
    extrude(amount=BOSS_EXTRUDE1_DEPTH, both=True)

    # Sketch2 → Boss-Extrude2 (add)
    with BuildSketch(Plane.XZ.offset(1.5)):
        with BuildLine():
            Line((-0.313290616, 4.715007748), (15.495042643, 3.3195926))
            ThreePointArc((15.495042643, 3.3195926), (18.969975659, -0.229613642), (15.495042643, -3.778819884))
            Line((15.495042643, -3.778819884), (-0.313290616, -5.174235033))
            ThreePointArc((-0.313290616, -5.174235033), (-6.130024341, -0.229613642), (-0.313290616, 4.715007748))
        make_face()
        with BuildLine():
            Line((-0.505153828, 3.22611121), (15.419975659, 1.820386358))
            ThreePointArc((15.419975659, 1.820386358), (17.469975659, -0.229613642), (15.419975659, -2.279613642))
            Line((15.419975659, -2.279613642), (-0.505153828, -3.685338494))
            ThreePointArc((-0.505153828, -3.685338494), (-4.630024341, -0.229613642), (-0.505153828, 3.22611121))
        make_face(mode=Mode.SUBTRACT)
    extrude(amount=BOSS_EXTRUDE2_DEPTH)


solid = part.part
